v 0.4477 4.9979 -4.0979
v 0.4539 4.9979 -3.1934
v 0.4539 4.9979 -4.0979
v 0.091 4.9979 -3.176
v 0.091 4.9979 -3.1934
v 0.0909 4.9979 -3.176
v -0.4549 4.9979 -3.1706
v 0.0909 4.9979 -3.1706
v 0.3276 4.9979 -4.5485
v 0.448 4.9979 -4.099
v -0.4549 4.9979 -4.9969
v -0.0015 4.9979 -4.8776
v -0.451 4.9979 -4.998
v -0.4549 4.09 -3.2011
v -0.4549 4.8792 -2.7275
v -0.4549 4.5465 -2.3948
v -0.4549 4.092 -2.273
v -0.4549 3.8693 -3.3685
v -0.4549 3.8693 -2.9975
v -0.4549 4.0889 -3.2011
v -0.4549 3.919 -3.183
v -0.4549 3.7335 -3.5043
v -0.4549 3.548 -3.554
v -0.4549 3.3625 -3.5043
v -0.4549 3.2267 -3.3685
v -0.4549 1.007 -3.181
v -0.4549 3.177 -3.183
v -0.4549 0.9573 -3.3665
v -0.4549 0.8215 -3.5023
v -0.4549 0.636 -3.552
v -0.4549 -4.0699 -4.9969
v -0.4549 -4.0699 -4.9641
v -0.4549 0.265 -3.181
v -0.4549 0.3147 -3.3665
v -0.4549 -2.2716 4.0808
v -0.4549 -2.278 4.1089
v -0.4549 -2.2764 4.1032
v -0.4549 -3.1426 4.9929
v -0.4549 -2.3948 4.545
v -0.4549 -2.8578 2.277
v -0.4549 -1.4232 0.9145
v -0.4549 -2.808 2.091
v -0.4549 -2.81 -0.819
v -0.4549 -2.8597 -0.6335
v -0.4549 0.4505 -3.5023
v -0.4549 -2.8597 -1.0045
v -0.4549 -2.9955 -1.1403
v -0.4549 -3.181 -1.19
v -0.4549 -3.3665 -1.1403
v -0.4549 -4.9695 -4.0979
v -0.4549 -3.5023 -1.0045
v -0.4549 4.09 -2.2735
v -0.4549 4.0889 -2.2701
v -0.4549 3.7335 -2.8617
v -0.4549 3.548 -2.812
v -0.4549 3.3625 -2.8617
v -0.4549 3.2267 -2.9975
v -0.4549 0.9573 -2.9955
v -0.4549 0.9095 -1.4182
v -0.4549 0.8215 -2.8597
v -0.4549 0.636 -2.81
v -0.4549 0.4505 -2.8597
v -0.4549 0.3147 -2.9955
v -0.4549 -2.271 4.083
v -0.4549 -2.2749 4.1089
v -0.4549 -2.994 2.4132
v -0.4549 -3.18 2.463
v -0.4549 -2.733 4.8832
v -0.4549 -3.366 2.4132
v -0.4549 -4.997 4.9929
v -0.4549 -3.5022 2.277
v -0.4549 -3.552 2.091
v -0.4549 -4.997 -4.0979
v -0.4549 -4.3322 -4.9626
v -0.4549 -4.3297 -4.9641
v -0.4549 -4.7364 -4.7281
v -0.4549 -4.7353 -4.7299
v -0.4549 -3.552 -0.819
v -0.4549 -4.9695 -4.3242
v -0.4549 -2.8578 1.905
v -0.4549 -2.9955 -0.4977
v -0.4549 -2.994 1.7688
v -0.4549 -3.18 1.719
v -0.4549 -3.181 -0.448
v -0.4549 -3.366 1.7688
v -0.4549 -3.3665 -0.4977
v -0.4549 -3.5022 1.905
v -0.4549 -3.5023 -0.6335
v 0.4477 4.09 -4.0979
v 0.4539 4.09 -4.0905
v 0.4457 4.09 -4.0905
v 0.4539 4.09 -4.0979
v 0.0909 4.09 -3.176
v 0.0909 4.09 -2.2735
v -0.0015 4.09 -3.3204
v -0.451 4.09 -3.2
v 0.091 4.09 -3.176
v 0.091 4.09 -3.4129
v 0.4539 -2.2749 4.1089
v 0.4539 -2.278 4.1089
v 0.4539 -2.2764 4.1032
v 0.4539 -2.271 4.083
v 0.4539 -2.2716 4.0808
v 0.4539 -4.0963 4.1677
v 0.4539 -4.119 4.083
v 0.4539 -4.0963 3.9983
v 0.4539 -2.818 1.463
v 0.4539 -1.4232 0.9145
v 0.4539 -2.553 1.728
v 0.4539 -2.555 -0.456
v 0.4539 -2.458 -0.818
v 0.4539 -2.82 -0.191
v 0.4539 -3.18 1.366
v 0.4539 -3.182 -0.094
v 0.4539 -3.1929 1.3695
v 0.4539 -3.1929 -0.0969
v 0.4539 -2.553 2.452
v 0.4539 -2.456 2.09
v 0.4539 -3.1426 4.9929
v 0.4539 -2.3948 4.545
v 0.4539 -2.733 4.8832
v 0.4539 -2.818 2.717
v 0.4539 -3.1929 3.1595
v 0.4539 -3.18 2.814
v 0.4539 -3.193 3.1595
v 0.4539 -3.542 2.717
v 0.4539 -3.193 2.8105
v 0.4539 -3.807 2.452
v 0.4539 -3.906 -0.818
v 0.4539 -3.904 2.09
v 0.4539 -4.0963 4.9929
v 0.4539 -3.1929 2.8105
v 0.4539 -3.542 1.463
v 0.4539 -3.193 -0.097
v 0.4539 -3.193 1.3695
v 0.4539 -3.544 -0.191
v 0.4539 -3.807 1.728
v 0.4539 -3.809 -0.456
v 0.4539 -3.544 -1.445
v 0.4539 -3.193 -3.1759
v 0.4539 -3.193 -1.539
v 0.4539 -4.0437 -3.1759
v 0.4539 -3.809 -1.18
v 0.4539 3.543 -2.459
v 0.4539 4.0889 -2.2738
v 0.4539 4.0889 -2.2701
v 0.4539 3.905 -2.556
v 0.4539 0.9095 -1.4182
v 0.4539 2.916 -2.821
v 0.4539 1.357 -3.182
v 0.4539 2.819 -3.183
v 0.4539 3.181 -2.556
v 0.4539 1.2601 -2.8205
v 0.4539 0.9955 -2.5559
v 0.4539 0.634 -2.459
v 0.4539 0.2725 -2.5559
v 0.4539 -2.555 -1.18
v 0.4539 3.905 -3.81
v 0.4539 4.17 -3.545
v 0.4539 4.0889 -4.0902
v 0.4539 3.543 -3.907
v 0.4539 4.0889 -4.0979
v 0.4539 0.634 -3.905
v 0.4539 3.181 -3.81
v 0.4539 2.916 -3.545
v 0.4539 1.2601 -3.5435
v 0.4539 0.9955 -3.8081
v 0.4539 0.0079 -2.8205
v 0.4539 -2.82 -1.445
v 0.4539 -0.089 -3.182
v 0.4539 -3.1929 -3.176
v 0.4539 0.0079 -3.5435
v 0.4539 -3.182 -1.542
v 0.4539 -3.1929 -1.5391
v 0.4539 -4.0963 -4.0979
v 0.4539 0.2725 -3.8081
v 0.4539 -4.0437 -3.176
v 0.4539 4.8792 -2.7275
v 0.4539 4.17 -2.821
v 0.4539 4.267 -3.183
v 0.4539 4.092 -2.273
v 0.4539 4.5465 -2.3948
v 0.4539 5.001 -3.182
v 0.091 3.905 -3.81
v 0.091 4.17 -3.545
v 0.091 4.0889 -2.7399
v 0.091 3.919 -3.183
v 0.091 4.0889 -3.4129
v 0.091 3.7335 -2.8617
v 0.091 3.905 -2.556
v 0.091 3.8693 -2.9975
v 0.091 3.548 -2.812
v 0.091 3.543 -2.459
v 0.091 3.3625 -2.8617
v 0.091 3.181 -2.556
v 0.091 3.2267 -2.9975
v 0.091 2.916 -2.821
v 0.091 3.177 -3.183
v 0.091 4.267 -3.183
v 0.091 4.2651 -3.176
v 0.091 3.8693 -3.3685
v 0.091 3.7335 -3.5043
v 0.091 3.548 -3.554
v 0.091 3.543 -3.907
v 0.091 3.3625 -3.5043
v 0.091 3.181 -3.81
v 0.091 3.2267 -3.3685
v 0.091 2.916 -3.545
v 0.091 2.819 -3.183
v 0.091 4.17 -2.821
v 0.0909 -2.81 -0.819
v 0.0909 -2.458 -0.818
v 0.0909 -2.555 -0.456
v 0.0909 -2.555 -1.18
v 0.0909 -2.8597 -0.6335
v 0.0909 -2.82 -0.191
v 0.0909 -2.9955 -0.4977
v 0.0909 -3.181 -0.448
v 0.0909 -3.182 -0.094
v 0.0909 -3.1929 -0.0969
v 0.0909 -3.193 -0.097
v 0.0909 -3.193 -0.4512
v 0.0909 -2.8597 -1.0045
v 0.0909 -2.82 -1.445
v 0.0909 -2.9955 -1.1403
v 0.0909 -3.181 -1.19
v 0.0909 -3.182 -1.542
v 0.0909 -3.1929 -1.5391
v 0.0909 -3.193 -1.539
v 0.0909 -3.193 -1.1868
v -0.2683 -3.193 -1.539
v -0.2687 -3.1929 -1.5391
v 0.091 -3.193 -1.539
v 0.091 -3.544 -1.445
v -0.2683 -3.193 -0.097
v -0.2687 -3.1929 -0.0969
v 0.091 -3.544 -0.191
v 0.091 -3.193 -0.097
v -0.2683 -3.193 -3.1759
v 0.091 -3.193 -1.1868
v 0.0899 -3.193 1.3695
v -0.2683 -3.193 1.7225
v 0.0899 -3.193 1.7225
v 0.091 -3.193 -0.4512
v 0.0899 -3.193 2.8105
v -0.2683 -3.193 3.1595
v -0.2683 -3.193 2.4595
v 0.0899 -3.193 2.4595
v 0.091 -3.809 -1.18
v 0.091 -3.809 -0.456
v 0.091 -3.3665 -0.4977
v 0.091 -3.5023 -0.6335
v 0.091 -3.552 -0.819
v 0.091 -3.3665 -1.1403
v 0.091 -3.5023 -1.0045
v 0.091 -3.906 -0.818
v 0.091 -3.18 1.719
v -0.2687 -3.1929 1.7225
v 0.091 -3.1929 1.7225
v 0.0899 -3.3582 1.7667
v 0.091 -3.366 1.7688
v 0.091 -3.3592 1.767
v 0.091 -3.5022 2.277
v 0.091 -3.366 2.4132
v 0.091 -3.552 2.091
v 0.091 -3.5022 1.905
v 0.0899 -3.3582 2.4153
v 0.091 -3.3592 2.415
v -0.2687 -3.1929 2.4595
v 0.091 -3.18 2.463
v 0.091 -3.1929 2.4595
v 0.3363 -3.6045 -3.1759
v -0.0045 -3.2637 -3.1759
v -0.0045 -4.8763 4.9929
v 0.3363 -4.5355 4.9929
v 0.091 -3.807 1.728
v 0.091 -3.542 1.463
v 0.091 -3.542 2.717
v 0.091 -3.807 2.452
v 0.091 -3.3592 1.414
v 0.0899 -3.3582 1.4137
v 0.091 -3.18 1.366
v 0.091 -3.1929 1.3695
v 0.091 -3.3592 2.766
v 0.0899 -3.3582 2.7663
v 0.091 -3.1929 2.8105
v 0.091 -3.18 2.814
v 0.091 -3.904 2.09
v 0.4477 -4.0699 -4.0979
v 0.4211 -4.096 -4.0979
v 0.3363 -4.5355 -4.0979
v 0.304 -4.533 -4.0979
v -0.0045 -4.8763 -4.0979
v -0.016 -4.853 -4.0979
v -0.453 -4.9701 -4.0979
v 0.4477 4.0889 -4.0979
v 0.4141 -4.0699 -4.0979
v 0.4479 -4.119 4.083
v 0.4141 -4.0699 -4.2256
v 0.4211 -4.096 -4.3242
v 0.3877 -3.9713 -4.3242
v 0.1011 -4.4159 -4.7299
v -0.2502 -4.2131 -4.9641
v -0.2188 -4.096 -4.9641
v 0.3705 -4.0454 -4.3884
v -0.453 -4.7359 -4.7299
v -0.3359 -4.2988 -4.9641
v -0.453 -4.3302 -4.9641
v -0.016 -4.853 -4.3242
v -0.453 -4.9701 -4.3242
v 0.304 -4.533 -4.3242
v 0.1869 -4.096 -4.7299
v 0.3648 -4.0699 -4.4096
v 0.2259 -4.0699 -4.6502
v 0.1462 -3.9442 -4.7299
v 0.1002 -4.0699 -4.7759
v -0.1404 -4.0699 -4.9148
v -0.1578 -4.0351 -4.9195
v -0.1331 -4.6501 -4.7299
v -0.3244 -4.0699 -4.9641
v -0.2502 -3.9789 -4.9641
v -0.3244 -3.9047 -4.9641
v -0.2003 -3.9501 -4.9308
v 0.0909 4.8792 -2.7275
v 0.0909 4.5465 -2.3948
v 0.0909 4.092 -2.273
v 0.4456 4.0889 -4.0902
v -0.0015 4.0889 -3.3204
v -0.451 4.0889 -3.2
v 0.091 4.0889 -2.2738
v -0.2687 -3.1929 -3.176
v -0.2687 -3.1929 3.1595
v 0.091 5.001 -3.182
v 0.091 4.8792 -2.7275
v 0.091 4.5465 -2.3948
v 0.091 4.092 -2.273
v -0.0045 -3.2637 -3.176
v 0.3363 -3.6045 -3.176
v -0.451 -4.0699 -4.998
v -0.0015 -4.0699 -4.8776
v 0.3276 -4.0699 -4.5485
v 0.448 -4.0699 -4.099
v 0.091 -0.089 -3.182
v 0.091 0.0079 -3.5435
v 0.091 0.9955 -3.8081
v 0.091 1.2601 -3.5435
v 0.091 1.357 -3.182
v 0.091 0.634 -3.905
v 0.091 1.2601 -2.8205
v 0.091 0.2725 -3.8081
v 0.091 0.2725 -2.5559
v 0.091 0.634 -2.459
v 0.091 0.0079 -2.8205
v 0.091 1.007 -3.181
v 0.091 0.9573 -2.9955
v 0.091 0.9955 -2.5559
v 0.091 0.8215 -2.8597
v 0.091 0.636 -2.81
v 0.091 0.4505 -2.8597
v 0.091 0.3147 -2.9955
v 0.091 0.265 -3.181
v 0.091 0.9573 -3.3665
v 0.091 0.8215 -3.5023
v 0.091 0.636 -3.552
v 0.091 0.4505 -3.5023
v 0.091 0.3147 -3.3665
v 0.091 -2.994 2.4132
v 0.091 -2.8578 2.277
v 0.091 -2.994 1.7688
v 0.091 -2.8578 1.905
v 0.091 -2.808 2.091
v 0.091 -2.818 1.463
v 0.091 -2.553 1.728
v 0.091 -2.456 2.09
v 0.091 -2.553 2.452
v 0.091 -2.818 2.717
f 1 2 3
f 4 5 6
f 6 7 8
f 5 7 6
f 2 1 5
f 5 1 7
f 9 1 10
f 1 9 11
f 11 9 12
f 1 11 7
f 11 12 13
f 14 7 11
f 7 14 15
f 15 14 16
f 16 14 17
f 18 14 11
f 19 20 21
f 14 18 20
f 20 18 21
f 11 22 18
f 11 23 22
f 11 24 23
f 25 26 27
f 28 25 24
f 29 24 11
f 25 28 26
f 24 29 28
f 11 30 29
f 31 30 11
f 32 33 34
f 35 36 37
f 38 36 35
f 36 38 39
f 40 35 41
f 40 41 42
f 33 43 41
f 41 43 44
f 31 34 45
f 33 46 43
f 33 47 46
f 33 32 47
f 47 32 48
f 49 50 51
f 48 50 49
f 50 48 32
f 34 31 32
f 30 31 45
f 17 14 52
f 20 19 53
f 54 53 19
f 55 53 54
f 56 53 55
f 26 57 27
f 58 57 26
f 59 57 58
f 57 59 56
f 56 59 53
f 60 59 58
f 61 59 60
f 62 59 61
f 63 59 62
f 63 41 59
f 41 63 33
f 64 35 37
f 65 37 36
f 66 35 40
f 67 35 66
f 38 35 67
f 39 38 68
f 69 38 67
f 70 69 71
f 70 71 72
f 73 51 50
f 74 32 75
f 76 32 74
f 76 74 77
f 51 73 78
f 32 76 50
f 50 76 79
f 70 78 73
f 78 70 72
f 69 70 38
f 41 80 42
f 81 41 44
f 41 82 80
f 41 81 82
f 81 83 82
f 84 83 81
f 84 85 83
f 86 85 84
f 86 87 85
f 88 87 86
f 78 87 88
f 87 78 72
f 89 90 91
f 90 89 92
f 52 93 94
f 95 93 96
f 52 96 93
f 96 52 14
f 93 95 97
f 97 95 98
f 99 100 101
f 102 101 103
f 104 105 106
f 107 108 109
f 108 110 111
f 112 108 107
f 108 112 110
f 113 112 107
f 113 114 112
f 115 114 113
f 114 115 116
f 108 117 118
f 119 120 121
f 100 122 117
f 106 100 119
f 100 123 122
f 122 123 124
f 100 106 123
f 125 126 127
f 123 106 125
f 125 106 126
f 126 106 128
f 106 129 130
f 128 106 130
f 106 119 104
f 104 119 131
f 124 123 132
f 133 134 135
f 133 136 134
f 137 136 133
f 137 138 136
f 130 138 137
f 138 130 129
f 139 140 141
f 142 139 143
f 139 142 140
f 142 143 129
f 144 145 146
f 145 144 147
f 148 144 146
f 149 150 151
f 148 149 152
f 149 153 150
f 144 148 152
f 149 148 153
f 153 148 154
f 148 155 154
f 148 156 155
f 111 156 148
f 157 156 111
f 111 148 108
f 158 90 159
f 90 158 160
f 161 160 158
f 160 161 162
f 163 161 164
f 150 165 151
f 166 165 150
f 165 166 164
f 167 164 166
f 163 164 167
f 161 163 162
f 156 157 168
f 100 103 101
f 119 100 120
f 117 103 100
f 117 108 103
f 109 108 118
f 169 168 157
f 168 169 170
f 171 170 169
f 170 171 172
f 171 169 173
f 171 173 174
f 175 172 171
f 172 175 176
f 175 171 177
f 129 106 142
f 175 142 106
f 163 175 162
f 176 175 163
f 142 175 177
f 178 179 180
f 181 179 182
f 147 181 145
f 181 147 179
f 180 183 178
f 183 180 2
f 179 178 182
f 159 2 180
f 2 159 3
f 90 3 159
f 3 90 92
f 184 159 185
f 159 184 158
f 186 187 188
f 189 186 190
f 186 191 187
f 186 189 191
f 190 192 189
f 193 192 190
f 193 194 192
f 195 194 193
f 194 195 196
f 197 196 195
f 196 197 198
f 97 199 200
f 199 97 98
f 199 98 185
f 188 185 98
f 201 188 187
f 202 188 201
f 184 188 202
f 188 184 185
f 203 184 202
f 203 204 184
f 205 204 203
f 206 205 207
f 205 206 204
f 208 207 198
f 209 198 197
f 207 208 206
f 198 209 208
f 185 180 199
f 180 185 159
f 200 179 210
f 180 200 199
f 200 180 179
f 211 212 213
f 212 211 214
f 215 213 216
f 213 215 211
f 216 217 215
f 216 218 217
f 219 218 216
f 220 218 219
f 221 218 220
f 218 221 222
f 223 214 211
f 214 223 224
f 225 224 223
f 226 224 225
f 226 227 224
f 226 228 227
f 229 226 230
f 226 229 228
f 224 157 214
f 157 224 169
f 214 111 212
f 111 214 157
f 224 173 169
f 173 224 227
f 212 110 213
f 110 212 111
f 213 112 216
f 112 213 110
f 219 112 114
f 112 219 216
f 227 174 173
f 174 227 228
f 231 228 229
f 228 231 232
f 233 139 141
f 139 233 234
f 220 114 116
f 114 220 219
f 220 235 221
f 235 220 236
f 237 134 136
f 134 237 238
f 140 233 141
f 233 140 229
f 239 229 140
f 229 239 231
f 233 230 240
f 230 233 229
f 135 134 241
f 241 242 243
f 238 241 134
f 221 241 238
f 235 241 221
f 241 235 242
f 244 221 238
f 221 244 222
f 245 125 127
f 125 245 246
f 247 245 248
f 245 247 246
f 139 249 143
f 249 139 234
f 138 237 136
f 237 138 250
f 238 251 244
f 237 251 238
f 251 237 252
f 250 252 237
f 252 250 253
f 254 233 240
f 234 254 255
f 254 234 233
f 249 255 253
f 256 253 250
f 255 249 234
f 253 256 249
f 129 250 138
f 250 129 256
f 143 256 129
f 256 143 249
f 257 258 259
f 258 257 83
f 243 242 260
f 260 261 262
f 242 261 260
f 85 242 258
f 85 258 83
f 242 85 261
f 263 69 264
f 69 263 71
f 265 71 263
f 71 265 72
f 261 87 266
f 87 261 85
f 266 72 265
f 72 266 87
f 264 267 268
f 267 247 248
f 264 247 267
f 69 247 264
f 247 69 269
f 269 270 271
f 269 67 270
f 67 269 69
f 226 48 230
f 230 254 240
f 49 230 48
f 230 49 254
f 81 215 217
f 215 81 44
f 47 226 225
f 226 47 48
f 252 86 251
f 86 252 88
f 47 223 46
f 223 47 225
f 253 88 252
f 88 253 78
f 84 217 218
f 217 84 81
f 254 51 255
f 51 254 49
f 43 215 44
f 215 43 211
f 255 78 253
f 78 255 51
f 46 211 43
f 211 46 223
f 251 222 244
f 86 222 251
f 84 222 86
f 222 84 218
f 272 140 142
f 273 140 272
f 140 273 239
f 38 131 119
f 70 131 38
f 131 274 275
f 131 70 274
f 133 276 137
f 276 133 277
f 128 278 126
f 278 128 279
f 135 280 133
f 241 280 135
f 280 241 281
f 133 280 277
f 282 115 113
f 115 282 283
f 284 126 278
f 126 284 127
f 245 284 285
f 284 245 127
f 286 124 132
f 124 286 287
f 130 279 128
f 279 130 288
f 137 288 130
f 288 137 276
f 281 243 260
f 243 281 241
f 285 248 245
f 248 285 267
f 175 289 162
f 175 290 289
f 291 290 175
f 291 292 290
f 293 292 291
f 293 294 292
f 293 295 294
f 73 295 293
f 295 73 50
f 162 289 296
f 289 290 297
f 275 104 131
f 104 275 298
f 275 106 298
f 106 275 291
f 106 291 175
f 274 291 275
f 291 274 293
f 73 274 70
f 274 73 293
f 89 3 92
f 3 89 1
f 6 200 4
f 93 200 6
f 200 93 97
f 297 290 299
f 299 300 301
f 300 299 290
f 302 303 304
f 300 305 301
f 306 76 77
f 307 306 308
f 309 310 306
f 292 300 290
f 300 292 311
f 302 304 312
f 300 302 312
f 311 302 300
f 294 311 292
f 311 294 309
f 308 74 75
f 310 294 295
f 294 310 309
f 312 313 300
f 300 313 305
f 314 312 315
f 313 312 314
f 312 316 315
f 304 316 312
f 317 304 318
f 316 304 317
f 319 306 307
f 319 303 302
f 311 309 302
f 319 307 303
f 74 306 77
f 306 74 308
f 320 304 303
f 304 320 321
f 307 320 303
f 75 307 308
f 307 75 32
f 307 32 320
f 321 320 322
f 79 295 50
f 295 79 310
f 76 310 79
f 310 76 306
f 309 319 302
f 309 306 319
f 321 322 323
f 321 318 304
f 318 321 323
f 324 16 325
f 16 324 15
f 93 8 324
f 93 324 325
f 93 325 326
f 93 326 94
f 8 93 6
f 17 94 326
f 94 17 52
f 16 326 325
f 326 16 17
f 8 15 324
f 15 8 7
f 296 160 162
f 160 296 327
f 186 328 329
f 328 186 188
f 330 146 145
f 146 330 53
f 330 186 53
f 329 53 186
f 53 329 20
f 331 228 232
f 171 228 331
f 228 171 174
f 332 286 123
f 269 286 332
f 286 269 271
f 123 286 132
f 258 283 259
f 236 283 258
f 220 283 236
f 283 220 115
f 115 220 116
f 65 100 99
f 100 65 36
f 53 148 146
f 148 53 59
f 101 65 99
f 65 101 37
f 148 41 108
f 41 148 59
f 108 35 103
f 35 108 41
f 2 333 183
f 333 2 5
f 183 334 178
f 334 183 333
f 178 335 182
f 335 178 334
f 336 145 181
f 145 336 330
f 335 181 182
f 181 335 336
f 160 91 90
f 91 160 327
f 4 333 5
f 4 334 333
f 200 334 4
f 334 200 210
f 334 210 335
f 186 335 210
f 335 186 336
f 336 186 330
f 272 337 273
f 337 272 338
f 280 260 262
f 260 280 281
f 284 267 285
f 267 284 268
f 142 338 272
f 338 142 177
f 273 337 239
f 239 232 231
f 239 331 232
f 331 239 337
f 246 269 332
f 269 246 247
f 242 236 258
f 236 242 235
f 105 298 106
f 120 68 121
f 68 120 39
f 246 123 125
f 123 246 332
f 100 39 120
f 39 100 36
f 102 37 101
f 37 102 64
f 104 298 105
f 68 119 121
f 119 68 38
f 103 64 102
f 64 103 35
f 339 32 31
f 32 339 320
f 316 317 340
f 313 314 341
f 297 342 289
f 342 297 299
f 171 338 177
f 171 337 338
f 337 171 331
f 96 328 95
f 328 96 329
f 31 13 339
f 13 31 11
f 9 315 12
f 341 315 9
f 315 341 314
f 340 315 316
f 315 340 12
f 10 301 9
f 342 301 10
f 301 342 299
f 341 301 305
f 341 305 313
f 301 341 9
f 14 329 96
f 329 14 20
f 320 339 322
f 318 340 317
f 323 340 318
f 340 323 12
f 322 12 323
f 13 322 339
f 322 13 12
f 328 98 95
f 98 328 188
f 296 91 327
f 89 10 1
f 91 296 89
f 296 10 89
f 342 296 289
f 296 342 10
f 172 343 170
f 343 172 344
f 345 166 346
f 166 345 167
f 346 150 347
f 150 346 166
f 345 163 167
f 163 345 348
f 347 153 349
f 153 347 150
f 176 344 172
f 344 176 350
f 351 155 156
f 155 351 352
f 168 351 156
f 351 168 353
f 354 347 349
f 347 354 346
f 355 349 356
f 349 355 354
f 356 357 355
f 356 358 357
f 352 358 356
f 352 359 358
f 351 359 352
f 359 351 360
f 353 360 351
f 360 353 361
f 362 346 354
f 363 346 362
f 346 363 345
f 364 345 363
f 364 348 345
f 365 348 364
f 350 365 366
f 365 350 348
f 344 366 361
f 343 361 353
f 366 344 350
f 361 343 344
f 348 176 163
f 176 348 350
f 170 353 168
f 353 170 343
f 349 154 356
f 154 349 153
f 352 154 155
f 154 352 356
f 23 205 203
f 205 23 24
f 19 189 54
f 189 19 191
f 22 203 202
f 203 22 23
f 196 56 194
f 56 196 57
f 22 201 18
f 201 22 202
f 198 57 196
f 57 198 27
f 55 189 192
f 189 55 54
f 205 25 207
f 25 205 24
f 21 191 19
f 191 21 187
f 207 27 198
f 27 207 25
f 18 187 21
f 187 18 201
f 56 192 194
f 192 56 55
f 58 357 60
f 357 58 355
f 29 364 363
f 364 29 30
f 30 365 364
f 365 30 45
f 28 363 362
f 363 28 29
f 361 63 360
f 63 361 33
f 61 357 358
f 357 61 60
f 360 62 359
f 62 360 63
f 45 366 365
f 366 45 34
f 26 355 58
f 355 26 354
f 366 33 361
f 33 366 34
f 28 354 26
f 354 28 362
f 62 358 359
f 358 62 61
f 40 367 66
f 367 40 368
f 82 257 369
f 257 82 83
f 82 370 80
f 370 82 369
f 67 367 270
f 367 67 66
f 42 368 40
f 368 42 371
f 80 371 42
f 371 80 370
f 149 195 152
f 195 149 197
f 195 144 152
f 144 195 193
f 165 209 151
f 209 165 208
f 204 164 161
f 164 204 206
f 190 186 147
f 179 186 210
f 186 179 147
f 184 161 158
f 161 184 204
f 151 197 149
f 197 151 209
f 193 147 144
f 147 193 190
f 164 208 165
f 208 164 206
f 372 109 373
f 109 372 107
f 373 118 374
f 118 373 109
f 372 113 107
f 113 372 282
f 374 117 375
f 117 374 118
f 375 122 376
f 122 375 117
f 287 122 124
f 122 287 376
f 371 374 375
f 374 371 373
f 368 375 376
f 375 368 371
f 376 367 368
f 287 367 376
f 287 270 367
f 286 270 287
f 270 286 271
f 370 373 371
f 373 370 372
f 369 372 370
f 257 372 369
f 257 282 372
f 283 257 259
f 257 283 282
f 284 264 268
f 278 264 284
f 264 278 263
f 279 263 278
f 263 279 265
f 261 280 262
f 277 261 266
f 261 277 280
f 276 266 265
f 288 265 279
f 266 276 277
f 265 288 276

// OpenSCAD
intersection() {
  translate([0.0005, 0, 0])
  cube(size = [1.0909, 11.9999, 11.9999], center = true);

  union() {
    intersection() {
      difference() {
        union() {
          translate([-9.0045, -3.182, -0.818])
          rotate([180, 90, 180])
          cylinder(h = 18.1909, r1 = 0.724, r2 = 0.724, center = true, $fn = 12);
        
          translate([-0.0005, -10.6465, 0])
          rotate([-90, 0, 0])
          cube(size = [0.9089, 36.1999, 14.9069], center = true);
        
          difference() {
            translate([-0.0005, 4.544, -6.9955])
            rotate([-90, 0, 0])
            cube(size = [0.9089, 22.2089, 0.9079], center = true);
          
            translate([9.0955, 3.543, -3.183])
            rotate([180, 90, 180])
            cylinder(h = 18.009, r1 = 0.724, r2 = 0.724, center = true, $fn = 12);
          }
        }
      
        union() {
          translate([9.0955, -3.182, -0.818])
          rotate([180, 90, 180])
          cylinder(h = 18.009, r1 = 0.724, r2 = 0.724, center = true, $fn = 12);
        
          translate([-9.0045, -3.18, 2.091])
          rotate([180, 90, 180])
          cylinder(h = 18.191, r1 = 0.372, r2 = 0.372, center = true, $fn = 12);
        
          translate([9.0955, -11.085, 0.4665])
          rotate([-90, 0, 0])
          cube(size = [18.009, 7.285, 14.03], center = true);
        
          translate([8.8225, -3.181, -0.819])
          rotate([180, 90, 180])
          cylinder(h = 18.555, r1 = 0.371, r2 = 0.371, center = true, $fn = 12);
        }
      }
    
      union() {
        difference() {
          translate([8.8225, 0.01, 0.9085])
          rotate([-90, 0, 0])
          cube(size = [18.5549, 8.1689, 8.1599], center = true);
        
          translate([-8.8225, -3.18, 2.09])
          rotate([180, 90, 180])
          cylinder(h = 18.555, r1 = 0.724, r2 = 0.724, center = true, $fn = 12);
        }
      
        translate([-0.1825, -3.18, 2.09])
        rotate([180, 90, 180])
        cylinder(h = 0.5449, r1 = 0.724, r2 = 0.724, center = true, $fn = 12);
      
        translate([-0.47, -4.07, -3.637])
        cylinder(h = 0.9219, r1 = 0.931, r2 = 0.931, center = true, $fn = 12);
      
        translate([-0.0005, 4.544, -3.637])
        rotate([-90, 0, 0])
        cube(size = [0.9089, 0.9219, 0.9079], center = true);
      
        translate([-0.453, -4.096, -4.09])
        sphere(r = 0.9049, $fn = 12);
      
        translate([-9.0045, 4.092, -3.182])
        rotate([180, 90, 180])
        cylinder(h = 18.1909, r1 = 0.909, r2 = 0.909, center = true, $fn = 12);
      }
    }
  
    intersection() {
      union() {
        translate([9.0955, 4.092, -3.182])
        rotate([180, 90, 180])
        cylinder(h = 18.0089, r1 = 0.909, r2 = 0.909, center = true, $fn = 12);
      
        translate([-0.47, -4.07, 7.001])
        cylinder(h = 22.1979, r1 = 0.931, r2 = 0.931, center = true, $fn = 12);
      
        translate([0, -3.195, 4.083])
        rotate([180, 90, 180])
        cylinder(h = 36.1999, r1 = 0.924, r2 = 0.924, center = true, $fn = 12);
      
        difference() {
          translate([0, 0.448, 0.0055])
          rotate([-90, 0, 0])
          cube(size = [36.1999, 8.2069, 7.2819], center = true);
        
          translate([-8.8225, 4.096, 4.101])
          rotate([180, 90, 180])
          cylinder(h = 18.555, r1 = 6.373, r2 = 6.373, center = true, $fn = 12);
        }
      
        translate([0, -3.631, -3.637])
        rotate([-90, 0, 0])
        cube(size = [36.1999, 0.9219, 0.8779], center = true);
      
        translate([-0.451, 0.464, -4.099])
        rotate([180, 90, -90])
        cylinder(h = 9.0679, r1 = 0.899, r2 = 0.899, center = true, $fn = 12);
      }
    
      difference() {
        difference() {
          difference() {
            translate([-0.0005, 0, -6.5535])
            rotate([-90, 0, 0])
            cube(size = [0.9089, 23.0929, 36.1999], center = true);
          
            translate([0.273, 0.634, -3.182])
            rotate([180, 90, 180])
            cylinder(h = 0.364, r1 = 0.723, r2 = 0.723, center = true, $fn = 12);
          }
        
          union() {
            translate([0, 3.548, -3.183])
            rotate([180, 90, 180])
            cylinder(h = 36.2, r1 = 0.371, r2 = 0.371, center = true, $fn = 12);
          
            translate([-8.8225, 0.636, -3.181])
            rotate([180, 90, 180])
            cylinder(h = 18.555, r1 = 0.371, r2 = 0.371, center = true, $fn = 12);
          }
        }
      
        union() {
          translate([8.8225, -3.18, 2.091])
          rotate([180, 90, 180])
          cylinder(h = 18.555, r1 = 0.372, r2 = 0.372, center = true, $fn = 12);
        
          translate([0, -3.182, -0.818])
          rotate([180, 90, 180])
          cylinder(h = 36.2, r1 = 0.724, r2 = 0.724, center = true, $fn = 12);
        
          translate([9.0955, 3.543, -3.183])
          rotate([180, 90, 180])
          cylinder(h = 18.009, r1 = 0.724, r2 = 0.724, center = true, $fn = 12);
        
          translate([0.273, -3.18, 2.09])
          rotate([180, 90, 180])
          cylinder(h = 0.364, r1 = 0.724, r2 = 0.724, center = true, $fn = 12);
        }
      }
    }
  }
}
